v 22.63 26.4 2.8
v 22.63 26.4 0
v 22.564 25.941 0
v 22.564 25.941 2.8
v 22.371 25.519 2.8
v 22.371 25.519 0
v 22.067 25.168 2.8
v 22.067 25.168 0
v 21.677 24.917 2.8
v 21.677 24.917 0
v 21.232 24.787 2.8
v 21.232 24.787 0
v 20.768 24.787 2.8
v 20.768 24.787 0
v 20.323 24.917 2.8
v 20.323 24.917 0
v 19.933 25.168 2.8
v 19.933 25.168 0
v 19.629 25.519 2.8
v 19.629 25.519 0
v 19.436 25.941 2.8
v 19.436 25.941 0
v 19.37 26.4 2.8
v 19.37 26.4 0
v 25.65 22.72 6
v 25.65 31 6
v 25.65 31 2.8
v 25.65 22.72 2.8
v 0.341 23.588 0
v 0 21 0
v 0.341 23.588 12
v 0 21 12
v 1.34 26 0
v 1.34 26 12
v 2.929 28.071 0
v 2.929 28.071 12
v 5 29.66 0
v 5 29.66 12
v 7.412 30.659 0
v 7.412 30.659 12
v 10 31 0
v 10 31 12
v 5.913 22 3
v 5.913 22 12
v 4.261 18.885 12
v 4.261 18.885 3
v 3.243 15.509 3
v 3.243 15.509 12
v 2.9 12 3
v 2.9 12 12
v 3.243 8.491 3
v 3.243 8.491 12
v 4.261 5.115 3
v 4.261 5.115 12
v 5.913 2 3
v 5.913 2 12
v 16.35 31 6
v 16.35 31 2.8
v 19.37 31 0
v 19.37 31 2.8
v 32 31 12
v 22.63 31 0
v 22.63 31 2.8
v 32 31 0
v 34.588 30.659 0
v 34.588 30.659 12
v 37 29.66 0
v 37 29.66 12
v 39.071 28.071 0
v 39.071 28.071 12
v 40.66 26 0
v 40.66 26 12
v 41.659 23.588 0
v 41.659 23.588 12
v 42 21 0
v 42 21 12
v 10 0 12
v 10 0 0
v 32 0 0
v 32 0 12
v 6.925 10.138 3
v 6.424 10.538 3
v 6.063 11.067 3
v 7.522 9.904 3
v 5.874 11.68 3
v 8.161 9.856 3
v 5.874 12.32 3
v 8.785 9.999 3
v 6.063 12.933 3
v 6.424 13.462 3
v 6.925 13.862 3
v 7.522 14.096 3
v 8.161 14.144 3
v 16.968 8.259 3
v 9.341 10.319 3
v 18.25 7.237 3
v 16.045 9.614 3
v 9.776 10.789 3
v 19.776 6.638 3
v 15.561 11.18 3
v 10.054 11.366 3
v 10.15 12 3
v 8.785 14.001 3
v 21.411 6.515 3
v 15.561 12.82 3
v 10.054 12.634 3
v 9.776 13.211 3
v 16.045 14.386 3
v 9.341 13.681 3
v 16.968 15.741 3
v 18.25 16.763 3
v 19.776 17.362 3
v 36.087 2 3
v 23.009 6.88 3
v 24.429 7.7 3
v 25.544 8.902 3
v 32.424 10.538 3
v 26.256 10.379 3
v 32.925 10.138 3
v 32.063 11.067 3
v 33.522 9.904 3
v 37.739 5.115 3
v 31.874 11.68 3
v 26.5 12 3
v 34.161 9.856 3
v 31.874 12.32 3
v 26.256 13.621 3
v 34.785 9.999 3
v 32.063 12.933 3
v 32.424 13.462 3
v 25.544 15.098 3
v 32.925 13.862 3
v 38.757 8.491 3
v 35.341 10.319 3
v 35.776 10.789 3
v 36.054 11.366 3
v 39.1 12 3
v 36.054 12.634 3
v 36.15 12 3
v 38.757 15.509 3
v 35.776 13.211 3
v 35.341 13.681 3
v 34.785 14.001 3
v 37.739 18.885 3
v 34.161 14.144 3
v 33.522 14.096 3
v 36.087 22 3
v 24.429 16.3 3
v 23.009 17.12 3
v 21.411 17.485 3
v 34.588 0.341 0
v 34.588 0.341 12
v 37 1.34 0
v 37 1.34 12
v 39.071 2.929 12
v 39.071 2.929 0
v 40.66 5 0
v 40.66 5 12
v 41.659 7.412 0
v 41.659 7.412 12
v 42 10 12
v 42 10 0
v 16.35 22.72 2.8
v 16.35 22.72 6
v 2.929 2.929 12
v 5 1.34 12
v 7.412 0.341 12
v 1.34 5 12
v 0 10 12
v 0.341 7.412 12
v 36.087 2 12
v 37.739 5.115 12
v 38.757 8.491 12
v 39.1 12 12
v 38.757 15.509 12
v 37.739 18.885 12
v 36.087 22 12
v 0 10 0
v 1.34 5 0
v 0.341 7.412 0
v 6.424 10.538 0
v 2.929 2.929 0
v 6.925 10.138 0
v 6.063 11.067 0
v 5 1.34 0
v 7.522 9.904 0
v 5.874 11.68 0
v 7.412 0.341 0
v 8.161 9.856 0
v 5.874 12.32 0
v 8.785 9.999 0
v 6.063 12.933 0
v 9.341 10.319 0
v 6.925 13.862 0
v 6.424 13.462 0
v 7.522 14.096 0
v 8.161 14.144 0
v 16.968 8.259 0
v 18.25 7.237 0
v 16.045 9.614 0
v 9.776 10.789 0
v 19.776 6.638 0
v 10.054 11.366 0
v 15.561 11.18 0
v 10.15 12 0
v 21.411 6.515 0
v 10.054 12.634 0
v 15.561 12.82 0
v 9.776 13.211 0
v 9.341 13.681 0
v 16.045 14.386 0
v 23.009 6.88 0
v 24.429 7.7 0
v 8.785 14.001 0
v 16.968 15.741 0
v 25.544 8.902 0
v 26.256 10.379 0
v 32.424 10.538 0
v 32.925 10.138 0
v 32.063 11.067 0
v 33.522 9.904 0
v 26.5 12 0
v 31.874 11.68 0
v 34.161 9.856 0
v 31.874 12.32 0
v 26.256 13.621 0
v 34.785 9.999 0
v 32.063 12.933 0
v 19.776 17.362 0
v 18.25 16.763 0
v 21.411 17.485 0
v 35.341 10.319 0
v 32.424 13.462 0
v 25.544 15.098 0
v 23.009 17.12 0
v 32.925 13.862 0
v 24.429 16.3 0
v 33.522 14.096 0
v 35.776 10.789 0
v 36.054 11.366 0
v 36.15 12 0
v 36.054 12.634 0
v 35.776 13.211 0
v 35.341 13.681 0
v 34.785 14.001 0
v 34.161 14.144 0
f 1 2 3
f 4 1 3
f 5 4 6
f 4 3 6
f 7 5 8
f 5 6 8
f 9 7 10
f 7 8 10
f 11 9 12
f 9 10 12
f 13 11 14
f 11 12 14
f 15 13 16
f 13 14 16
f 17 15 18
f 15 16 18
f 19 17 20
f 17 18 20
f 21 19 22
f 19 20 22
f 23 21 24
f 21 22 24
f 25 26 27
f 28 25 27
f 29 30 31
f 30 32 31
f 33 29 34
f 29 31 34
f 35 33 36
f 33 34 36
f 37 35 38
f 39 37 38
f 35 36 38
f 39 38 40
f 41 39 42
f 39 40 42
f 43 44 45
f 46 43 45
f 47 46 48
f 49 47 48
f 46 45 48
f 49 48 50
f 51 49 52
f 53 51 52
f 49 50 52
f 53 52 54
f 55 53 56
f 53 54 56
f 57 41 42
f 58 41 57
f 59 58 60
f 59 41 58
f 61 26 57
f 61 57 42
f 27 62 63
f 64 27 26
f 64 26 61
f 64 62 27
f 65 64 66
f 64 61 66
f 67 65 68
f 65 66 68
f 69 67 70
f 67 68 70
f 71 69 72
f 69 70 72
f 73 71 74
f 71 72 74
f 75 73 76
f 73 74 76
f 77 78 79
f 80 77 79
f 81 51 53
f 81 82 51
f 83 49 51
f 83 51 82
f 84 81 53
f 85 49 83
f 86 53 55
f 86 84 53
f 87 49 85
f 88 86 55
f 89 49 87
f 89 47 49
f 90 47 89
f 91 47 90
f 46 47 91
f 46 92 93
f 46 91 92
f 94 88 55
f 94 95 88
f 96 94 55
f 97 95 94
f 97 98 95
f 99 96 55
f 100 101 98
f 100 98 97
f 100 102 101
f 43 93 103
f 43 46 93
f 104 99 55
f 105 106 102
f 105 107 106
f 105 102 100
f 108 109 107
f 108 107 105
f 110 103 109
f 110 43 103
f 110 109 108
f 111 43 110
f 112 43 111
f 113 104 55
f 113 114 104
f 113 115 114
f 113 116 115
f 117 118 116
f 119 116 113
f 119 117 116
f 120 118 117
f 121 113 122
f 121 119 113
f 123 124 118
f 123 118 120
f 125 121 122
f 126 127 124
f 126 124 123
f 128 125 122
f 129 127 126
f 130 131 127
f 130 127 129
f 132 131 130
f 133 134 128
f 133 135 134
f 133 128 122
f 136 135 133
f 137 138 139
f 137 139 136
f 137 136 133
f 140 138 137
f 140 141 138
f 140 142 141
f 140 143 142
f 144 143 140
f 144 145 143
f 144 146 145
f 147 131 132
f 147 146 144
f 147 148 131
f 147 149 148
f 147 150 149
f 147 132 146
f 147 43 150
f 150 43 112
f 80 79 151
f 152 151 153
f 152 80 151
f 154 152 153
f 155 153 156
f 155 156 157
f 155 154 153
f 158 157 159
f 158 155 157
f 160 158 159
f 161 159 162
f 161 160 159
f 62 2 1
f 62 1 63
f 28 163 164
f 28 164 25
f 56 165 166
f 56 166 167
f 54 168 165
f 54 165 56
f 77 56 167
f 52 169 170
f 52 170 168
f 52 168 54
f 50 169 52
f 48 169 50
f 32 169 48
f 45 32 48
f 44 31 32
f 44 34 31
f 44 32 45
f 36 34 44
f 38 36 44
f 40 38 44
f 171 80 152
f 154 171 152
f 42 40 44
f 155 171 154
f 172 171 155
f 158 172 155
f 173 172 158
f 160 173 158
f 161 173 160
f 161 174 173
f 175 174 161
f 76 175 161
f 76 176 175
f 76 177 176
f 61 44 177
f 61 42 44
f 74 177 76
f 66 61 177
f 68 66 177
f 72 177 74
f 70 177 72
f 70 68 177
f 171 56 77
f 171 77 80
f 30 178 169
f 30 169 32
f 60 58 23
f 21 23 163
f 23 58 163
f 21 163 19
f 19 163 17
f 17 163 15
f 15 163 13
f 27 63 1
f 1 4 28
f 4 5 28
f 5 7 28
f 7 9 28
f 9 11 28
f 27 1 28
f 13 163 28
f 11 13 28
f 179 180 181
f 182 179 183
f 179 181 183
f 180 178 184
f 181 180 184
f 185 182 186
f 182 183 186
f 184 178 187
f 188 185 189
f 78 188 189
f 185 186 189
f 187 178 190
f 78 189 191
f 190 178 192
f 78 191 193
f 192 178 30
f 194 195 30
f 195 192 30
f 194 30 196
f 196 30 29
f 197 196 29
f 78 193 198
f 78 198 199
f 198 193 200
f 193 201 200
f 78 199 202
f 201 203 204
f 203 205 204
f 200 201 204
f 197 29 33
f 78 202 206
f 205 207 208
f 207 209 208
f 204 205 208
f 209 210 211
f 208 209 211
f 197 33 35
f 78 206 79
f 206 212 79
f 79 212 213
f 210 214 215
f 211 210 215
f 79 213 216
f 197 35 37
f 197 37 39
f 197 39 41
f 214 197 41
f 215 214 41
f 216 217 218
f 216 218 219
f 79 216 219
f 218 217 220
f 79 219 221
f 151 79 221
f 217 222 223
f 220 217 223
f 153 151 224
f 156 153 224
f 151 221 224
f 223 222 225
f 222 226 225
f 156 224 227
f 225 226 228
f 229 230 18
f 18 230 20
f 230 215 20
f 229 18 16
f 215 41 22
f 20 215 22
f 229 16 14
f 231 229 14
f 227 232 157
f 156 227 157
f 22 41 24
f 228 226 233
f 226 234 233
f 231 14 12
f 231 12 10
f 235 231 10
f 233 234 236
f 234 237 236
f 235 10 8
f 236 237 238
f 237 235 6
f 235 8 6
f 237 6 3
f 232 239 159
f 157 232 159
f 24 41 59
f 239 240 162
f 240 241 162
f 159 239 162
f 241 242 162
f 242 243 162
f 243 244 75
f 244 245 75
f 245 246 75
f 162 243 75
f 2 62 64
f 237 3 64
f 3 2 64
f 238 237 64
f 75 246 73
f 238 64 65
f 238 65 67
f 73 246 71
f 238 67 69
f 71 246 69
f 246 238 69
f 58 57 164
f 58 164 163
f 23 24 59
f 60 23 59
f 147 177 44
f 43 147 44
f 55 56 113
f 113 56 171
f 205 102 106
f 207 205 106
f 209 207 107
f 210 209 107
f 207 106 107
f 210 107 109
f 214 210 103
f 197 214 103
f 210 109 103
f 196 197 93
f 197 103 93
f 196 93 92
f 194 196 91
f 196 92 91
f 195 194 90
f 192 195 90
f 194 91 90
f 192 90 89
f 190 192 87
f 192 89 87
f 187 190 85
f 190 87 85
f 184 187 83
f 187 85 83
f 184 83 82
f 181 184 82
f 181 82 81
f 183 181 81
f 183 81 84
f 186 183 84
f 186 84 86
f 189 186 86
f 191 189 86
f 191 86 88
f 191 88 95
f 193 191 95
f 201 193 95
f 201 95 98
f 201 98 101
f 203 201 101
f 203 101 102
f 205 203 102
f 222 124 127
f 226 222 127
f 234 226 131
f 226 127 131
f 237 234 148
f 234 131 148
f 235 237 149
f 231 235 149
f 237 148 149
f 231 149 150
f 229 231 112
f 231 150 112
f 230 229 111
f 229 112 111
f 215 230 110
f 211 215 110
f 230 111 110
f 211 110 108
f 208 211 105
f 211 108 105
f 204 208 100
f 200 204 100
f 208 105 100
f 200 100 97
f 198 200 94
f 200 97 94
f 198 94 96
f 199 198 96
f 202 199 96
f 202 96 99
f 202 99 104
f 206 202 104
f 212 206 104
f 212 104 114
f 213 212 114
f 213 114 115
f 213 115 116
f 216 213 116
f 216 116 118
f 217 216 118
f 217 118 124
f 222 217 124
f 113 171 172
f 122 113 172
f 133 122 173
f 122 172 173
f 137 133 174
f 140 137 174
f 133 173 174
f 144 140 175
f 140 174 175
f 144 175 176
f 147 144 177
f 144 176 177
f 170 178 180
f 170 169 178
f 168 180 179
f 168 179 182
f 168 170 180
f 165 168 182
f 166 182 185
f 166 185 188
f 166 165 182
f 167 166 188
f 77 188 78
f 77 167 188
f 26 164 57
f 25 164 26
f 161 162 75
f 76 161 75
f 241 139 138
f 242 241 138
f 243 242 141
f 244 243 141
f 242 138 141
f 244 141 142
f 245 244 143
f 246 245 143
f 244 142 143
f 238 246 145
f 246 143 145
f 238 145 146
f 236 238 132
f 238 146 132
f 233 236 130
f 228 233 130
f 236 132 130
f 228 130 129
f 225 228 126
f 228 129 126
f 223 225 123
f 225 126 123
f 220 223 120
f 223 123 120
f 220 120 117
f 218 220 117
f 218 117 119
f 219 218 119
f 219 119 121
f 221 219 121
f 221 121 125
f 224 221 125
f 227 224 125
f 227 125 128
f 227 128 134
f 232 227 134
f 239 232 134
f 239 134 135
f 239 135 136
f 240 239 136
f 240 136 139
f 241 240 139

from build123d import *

# Parameters (mm, degrees)
SKETCH1_W               = 42
SKETCH1_H               = 31
BOSS_EXTRUDE1_DEPTH     = 12
CUT_EXTRUDE1_DEPTH      = 9
SKETCH4_R               = 2.15
CUT_EXTRUDE3_DEPTH      = 10
BOSS_EXTRUDE2_START     = -8.28
BOSS_EXTRUDE2_OUTLINE_W = 9.3
BOSS_EXTRUDE2_OUTLINE_H = 3.2
BOSS_EXTRUDE2_DEPTH     = 8.28
SKETCH6_R               = 1.63
CUT_EXTRUDE4_DEPTH      = 2.8
SKETCH7_W               = 3.26
SKETCH7_H               = 4.6
CUT_EXTRUDE5_DEPTH      = 2.8
FILLET1_R               = 10
SKETCH14_R              = 5.5
CUT_EXTRUDE7_DEPTH      = 53.971690553


# Read off the part's stored shape, not the designer's step: Boss-Extrude2
with BuildPart() as part:
    # Sketch1 → Boss-Extrude1 (new body)
    with BuildSketch(Plane.XY):
        with Locations((21, 15.5)):
            Rectangle(SKETCH1_W, SKETCH1_H)
    extrude(amount=BOSS_EXTRUDE1_DEPTH)

    # Sketch2 → Cut-Extrude1 (cut)
    with BuildSketch(Plane.XY.offset(12)):
        with BuildLine():
            Line((36.086749153, 22), (5.913250847, 22))
            ThreePointArc((5.913250847, 22), (2.9, 12), (5.913250847, 2))
            Line((5.913250847, 2), (36.086749153, 2))
            ThreePointArc((36.086749153, 2), (39.1, 12), (36.086749153, 22))
        make_face()
    extrude(amount=-CUT_EXTRUDE1_DEPTH, mode=Mode.SUBTRACT)

    # Sketch4 → Cut-Extrude3 (cut)
    with BuildSketch(Plane.XY.offset(3)):
        with Locations((8, 12)):
            Circle(SKETCH4_R)
        with Locations((34, 12)):
            Circle(SKETCH4_R)
    extrude(amount=-CUT_EXTRUDE3_DEPTH, mode=Mode.SUBTRACT)

    # Boss-Extrude2 outline → Boss-Extrude2 (cut)
    with BuildSketch(Plane(origin=(0, 31, 0), x_dir=(1, 0, 0), z_dir=(0, 1, 0)).offset(BOSS_EXTRUDE2_START)):
        with Locations((21, -4.4)):
            Rectangle(BOSS_EXTRUDE2_OUTLINE_W, BOSS_EXTRUDE2_OUTLINE_H)
    extrude(amount=BOSS_EXTRUDE2_DEPTH, mode=Mode.SUBTRACT)

    # Sketch6 → Cut-Extrude4 (cut)
    with BuildSketch(Plane(origin=(0, 0, 0), x_dir=(-1, 0, 0), z_dir=(0, 0, -1))):
        with Locations((-21, 26.4)):
            Circle(SKETCH6_R)
    extrude(amount=-CUT_EXTRUDE4_DEPTH, mode=Mode.SUBTRACT)

    # Sketch7 → Cut-Extrude5 (cut)
    with BuildSketch(Plane(origin=(0, 0, 0), x_dir=(-1, 0, 0), z_dir=(0, 0, -1))):
        with Locations((-21, 28.7)):
            Rectangle(SKETCH7_W, SKETCH7_H)
    extrude(amount=-CUT_EXTRUDE5_DEPTH, mode=Mode.SUBTRACT)

    # Fillet1
    fillet1_edges = [part.edges().sort_by_distance(p)[0] for p in [
        (0, 0, 6),
        (0, 31, 6),
        (42, 31, 6),
        (42, 0, 6),
    ]]
    fillet(fillet1_edges, radius=FILLET1_R)

    # Sketch14 → Cut-Extrude7 (cut, through all)
    with BuildSketch(Plane.XY.offset(3)):
        with Locations((21, 12)):
            Circle(SKETCH14_R)
    extrude(amount=-CUT_EXTRUDE7_DEPTH, mode=Mode.SUBTRACT)


solid = part.part
